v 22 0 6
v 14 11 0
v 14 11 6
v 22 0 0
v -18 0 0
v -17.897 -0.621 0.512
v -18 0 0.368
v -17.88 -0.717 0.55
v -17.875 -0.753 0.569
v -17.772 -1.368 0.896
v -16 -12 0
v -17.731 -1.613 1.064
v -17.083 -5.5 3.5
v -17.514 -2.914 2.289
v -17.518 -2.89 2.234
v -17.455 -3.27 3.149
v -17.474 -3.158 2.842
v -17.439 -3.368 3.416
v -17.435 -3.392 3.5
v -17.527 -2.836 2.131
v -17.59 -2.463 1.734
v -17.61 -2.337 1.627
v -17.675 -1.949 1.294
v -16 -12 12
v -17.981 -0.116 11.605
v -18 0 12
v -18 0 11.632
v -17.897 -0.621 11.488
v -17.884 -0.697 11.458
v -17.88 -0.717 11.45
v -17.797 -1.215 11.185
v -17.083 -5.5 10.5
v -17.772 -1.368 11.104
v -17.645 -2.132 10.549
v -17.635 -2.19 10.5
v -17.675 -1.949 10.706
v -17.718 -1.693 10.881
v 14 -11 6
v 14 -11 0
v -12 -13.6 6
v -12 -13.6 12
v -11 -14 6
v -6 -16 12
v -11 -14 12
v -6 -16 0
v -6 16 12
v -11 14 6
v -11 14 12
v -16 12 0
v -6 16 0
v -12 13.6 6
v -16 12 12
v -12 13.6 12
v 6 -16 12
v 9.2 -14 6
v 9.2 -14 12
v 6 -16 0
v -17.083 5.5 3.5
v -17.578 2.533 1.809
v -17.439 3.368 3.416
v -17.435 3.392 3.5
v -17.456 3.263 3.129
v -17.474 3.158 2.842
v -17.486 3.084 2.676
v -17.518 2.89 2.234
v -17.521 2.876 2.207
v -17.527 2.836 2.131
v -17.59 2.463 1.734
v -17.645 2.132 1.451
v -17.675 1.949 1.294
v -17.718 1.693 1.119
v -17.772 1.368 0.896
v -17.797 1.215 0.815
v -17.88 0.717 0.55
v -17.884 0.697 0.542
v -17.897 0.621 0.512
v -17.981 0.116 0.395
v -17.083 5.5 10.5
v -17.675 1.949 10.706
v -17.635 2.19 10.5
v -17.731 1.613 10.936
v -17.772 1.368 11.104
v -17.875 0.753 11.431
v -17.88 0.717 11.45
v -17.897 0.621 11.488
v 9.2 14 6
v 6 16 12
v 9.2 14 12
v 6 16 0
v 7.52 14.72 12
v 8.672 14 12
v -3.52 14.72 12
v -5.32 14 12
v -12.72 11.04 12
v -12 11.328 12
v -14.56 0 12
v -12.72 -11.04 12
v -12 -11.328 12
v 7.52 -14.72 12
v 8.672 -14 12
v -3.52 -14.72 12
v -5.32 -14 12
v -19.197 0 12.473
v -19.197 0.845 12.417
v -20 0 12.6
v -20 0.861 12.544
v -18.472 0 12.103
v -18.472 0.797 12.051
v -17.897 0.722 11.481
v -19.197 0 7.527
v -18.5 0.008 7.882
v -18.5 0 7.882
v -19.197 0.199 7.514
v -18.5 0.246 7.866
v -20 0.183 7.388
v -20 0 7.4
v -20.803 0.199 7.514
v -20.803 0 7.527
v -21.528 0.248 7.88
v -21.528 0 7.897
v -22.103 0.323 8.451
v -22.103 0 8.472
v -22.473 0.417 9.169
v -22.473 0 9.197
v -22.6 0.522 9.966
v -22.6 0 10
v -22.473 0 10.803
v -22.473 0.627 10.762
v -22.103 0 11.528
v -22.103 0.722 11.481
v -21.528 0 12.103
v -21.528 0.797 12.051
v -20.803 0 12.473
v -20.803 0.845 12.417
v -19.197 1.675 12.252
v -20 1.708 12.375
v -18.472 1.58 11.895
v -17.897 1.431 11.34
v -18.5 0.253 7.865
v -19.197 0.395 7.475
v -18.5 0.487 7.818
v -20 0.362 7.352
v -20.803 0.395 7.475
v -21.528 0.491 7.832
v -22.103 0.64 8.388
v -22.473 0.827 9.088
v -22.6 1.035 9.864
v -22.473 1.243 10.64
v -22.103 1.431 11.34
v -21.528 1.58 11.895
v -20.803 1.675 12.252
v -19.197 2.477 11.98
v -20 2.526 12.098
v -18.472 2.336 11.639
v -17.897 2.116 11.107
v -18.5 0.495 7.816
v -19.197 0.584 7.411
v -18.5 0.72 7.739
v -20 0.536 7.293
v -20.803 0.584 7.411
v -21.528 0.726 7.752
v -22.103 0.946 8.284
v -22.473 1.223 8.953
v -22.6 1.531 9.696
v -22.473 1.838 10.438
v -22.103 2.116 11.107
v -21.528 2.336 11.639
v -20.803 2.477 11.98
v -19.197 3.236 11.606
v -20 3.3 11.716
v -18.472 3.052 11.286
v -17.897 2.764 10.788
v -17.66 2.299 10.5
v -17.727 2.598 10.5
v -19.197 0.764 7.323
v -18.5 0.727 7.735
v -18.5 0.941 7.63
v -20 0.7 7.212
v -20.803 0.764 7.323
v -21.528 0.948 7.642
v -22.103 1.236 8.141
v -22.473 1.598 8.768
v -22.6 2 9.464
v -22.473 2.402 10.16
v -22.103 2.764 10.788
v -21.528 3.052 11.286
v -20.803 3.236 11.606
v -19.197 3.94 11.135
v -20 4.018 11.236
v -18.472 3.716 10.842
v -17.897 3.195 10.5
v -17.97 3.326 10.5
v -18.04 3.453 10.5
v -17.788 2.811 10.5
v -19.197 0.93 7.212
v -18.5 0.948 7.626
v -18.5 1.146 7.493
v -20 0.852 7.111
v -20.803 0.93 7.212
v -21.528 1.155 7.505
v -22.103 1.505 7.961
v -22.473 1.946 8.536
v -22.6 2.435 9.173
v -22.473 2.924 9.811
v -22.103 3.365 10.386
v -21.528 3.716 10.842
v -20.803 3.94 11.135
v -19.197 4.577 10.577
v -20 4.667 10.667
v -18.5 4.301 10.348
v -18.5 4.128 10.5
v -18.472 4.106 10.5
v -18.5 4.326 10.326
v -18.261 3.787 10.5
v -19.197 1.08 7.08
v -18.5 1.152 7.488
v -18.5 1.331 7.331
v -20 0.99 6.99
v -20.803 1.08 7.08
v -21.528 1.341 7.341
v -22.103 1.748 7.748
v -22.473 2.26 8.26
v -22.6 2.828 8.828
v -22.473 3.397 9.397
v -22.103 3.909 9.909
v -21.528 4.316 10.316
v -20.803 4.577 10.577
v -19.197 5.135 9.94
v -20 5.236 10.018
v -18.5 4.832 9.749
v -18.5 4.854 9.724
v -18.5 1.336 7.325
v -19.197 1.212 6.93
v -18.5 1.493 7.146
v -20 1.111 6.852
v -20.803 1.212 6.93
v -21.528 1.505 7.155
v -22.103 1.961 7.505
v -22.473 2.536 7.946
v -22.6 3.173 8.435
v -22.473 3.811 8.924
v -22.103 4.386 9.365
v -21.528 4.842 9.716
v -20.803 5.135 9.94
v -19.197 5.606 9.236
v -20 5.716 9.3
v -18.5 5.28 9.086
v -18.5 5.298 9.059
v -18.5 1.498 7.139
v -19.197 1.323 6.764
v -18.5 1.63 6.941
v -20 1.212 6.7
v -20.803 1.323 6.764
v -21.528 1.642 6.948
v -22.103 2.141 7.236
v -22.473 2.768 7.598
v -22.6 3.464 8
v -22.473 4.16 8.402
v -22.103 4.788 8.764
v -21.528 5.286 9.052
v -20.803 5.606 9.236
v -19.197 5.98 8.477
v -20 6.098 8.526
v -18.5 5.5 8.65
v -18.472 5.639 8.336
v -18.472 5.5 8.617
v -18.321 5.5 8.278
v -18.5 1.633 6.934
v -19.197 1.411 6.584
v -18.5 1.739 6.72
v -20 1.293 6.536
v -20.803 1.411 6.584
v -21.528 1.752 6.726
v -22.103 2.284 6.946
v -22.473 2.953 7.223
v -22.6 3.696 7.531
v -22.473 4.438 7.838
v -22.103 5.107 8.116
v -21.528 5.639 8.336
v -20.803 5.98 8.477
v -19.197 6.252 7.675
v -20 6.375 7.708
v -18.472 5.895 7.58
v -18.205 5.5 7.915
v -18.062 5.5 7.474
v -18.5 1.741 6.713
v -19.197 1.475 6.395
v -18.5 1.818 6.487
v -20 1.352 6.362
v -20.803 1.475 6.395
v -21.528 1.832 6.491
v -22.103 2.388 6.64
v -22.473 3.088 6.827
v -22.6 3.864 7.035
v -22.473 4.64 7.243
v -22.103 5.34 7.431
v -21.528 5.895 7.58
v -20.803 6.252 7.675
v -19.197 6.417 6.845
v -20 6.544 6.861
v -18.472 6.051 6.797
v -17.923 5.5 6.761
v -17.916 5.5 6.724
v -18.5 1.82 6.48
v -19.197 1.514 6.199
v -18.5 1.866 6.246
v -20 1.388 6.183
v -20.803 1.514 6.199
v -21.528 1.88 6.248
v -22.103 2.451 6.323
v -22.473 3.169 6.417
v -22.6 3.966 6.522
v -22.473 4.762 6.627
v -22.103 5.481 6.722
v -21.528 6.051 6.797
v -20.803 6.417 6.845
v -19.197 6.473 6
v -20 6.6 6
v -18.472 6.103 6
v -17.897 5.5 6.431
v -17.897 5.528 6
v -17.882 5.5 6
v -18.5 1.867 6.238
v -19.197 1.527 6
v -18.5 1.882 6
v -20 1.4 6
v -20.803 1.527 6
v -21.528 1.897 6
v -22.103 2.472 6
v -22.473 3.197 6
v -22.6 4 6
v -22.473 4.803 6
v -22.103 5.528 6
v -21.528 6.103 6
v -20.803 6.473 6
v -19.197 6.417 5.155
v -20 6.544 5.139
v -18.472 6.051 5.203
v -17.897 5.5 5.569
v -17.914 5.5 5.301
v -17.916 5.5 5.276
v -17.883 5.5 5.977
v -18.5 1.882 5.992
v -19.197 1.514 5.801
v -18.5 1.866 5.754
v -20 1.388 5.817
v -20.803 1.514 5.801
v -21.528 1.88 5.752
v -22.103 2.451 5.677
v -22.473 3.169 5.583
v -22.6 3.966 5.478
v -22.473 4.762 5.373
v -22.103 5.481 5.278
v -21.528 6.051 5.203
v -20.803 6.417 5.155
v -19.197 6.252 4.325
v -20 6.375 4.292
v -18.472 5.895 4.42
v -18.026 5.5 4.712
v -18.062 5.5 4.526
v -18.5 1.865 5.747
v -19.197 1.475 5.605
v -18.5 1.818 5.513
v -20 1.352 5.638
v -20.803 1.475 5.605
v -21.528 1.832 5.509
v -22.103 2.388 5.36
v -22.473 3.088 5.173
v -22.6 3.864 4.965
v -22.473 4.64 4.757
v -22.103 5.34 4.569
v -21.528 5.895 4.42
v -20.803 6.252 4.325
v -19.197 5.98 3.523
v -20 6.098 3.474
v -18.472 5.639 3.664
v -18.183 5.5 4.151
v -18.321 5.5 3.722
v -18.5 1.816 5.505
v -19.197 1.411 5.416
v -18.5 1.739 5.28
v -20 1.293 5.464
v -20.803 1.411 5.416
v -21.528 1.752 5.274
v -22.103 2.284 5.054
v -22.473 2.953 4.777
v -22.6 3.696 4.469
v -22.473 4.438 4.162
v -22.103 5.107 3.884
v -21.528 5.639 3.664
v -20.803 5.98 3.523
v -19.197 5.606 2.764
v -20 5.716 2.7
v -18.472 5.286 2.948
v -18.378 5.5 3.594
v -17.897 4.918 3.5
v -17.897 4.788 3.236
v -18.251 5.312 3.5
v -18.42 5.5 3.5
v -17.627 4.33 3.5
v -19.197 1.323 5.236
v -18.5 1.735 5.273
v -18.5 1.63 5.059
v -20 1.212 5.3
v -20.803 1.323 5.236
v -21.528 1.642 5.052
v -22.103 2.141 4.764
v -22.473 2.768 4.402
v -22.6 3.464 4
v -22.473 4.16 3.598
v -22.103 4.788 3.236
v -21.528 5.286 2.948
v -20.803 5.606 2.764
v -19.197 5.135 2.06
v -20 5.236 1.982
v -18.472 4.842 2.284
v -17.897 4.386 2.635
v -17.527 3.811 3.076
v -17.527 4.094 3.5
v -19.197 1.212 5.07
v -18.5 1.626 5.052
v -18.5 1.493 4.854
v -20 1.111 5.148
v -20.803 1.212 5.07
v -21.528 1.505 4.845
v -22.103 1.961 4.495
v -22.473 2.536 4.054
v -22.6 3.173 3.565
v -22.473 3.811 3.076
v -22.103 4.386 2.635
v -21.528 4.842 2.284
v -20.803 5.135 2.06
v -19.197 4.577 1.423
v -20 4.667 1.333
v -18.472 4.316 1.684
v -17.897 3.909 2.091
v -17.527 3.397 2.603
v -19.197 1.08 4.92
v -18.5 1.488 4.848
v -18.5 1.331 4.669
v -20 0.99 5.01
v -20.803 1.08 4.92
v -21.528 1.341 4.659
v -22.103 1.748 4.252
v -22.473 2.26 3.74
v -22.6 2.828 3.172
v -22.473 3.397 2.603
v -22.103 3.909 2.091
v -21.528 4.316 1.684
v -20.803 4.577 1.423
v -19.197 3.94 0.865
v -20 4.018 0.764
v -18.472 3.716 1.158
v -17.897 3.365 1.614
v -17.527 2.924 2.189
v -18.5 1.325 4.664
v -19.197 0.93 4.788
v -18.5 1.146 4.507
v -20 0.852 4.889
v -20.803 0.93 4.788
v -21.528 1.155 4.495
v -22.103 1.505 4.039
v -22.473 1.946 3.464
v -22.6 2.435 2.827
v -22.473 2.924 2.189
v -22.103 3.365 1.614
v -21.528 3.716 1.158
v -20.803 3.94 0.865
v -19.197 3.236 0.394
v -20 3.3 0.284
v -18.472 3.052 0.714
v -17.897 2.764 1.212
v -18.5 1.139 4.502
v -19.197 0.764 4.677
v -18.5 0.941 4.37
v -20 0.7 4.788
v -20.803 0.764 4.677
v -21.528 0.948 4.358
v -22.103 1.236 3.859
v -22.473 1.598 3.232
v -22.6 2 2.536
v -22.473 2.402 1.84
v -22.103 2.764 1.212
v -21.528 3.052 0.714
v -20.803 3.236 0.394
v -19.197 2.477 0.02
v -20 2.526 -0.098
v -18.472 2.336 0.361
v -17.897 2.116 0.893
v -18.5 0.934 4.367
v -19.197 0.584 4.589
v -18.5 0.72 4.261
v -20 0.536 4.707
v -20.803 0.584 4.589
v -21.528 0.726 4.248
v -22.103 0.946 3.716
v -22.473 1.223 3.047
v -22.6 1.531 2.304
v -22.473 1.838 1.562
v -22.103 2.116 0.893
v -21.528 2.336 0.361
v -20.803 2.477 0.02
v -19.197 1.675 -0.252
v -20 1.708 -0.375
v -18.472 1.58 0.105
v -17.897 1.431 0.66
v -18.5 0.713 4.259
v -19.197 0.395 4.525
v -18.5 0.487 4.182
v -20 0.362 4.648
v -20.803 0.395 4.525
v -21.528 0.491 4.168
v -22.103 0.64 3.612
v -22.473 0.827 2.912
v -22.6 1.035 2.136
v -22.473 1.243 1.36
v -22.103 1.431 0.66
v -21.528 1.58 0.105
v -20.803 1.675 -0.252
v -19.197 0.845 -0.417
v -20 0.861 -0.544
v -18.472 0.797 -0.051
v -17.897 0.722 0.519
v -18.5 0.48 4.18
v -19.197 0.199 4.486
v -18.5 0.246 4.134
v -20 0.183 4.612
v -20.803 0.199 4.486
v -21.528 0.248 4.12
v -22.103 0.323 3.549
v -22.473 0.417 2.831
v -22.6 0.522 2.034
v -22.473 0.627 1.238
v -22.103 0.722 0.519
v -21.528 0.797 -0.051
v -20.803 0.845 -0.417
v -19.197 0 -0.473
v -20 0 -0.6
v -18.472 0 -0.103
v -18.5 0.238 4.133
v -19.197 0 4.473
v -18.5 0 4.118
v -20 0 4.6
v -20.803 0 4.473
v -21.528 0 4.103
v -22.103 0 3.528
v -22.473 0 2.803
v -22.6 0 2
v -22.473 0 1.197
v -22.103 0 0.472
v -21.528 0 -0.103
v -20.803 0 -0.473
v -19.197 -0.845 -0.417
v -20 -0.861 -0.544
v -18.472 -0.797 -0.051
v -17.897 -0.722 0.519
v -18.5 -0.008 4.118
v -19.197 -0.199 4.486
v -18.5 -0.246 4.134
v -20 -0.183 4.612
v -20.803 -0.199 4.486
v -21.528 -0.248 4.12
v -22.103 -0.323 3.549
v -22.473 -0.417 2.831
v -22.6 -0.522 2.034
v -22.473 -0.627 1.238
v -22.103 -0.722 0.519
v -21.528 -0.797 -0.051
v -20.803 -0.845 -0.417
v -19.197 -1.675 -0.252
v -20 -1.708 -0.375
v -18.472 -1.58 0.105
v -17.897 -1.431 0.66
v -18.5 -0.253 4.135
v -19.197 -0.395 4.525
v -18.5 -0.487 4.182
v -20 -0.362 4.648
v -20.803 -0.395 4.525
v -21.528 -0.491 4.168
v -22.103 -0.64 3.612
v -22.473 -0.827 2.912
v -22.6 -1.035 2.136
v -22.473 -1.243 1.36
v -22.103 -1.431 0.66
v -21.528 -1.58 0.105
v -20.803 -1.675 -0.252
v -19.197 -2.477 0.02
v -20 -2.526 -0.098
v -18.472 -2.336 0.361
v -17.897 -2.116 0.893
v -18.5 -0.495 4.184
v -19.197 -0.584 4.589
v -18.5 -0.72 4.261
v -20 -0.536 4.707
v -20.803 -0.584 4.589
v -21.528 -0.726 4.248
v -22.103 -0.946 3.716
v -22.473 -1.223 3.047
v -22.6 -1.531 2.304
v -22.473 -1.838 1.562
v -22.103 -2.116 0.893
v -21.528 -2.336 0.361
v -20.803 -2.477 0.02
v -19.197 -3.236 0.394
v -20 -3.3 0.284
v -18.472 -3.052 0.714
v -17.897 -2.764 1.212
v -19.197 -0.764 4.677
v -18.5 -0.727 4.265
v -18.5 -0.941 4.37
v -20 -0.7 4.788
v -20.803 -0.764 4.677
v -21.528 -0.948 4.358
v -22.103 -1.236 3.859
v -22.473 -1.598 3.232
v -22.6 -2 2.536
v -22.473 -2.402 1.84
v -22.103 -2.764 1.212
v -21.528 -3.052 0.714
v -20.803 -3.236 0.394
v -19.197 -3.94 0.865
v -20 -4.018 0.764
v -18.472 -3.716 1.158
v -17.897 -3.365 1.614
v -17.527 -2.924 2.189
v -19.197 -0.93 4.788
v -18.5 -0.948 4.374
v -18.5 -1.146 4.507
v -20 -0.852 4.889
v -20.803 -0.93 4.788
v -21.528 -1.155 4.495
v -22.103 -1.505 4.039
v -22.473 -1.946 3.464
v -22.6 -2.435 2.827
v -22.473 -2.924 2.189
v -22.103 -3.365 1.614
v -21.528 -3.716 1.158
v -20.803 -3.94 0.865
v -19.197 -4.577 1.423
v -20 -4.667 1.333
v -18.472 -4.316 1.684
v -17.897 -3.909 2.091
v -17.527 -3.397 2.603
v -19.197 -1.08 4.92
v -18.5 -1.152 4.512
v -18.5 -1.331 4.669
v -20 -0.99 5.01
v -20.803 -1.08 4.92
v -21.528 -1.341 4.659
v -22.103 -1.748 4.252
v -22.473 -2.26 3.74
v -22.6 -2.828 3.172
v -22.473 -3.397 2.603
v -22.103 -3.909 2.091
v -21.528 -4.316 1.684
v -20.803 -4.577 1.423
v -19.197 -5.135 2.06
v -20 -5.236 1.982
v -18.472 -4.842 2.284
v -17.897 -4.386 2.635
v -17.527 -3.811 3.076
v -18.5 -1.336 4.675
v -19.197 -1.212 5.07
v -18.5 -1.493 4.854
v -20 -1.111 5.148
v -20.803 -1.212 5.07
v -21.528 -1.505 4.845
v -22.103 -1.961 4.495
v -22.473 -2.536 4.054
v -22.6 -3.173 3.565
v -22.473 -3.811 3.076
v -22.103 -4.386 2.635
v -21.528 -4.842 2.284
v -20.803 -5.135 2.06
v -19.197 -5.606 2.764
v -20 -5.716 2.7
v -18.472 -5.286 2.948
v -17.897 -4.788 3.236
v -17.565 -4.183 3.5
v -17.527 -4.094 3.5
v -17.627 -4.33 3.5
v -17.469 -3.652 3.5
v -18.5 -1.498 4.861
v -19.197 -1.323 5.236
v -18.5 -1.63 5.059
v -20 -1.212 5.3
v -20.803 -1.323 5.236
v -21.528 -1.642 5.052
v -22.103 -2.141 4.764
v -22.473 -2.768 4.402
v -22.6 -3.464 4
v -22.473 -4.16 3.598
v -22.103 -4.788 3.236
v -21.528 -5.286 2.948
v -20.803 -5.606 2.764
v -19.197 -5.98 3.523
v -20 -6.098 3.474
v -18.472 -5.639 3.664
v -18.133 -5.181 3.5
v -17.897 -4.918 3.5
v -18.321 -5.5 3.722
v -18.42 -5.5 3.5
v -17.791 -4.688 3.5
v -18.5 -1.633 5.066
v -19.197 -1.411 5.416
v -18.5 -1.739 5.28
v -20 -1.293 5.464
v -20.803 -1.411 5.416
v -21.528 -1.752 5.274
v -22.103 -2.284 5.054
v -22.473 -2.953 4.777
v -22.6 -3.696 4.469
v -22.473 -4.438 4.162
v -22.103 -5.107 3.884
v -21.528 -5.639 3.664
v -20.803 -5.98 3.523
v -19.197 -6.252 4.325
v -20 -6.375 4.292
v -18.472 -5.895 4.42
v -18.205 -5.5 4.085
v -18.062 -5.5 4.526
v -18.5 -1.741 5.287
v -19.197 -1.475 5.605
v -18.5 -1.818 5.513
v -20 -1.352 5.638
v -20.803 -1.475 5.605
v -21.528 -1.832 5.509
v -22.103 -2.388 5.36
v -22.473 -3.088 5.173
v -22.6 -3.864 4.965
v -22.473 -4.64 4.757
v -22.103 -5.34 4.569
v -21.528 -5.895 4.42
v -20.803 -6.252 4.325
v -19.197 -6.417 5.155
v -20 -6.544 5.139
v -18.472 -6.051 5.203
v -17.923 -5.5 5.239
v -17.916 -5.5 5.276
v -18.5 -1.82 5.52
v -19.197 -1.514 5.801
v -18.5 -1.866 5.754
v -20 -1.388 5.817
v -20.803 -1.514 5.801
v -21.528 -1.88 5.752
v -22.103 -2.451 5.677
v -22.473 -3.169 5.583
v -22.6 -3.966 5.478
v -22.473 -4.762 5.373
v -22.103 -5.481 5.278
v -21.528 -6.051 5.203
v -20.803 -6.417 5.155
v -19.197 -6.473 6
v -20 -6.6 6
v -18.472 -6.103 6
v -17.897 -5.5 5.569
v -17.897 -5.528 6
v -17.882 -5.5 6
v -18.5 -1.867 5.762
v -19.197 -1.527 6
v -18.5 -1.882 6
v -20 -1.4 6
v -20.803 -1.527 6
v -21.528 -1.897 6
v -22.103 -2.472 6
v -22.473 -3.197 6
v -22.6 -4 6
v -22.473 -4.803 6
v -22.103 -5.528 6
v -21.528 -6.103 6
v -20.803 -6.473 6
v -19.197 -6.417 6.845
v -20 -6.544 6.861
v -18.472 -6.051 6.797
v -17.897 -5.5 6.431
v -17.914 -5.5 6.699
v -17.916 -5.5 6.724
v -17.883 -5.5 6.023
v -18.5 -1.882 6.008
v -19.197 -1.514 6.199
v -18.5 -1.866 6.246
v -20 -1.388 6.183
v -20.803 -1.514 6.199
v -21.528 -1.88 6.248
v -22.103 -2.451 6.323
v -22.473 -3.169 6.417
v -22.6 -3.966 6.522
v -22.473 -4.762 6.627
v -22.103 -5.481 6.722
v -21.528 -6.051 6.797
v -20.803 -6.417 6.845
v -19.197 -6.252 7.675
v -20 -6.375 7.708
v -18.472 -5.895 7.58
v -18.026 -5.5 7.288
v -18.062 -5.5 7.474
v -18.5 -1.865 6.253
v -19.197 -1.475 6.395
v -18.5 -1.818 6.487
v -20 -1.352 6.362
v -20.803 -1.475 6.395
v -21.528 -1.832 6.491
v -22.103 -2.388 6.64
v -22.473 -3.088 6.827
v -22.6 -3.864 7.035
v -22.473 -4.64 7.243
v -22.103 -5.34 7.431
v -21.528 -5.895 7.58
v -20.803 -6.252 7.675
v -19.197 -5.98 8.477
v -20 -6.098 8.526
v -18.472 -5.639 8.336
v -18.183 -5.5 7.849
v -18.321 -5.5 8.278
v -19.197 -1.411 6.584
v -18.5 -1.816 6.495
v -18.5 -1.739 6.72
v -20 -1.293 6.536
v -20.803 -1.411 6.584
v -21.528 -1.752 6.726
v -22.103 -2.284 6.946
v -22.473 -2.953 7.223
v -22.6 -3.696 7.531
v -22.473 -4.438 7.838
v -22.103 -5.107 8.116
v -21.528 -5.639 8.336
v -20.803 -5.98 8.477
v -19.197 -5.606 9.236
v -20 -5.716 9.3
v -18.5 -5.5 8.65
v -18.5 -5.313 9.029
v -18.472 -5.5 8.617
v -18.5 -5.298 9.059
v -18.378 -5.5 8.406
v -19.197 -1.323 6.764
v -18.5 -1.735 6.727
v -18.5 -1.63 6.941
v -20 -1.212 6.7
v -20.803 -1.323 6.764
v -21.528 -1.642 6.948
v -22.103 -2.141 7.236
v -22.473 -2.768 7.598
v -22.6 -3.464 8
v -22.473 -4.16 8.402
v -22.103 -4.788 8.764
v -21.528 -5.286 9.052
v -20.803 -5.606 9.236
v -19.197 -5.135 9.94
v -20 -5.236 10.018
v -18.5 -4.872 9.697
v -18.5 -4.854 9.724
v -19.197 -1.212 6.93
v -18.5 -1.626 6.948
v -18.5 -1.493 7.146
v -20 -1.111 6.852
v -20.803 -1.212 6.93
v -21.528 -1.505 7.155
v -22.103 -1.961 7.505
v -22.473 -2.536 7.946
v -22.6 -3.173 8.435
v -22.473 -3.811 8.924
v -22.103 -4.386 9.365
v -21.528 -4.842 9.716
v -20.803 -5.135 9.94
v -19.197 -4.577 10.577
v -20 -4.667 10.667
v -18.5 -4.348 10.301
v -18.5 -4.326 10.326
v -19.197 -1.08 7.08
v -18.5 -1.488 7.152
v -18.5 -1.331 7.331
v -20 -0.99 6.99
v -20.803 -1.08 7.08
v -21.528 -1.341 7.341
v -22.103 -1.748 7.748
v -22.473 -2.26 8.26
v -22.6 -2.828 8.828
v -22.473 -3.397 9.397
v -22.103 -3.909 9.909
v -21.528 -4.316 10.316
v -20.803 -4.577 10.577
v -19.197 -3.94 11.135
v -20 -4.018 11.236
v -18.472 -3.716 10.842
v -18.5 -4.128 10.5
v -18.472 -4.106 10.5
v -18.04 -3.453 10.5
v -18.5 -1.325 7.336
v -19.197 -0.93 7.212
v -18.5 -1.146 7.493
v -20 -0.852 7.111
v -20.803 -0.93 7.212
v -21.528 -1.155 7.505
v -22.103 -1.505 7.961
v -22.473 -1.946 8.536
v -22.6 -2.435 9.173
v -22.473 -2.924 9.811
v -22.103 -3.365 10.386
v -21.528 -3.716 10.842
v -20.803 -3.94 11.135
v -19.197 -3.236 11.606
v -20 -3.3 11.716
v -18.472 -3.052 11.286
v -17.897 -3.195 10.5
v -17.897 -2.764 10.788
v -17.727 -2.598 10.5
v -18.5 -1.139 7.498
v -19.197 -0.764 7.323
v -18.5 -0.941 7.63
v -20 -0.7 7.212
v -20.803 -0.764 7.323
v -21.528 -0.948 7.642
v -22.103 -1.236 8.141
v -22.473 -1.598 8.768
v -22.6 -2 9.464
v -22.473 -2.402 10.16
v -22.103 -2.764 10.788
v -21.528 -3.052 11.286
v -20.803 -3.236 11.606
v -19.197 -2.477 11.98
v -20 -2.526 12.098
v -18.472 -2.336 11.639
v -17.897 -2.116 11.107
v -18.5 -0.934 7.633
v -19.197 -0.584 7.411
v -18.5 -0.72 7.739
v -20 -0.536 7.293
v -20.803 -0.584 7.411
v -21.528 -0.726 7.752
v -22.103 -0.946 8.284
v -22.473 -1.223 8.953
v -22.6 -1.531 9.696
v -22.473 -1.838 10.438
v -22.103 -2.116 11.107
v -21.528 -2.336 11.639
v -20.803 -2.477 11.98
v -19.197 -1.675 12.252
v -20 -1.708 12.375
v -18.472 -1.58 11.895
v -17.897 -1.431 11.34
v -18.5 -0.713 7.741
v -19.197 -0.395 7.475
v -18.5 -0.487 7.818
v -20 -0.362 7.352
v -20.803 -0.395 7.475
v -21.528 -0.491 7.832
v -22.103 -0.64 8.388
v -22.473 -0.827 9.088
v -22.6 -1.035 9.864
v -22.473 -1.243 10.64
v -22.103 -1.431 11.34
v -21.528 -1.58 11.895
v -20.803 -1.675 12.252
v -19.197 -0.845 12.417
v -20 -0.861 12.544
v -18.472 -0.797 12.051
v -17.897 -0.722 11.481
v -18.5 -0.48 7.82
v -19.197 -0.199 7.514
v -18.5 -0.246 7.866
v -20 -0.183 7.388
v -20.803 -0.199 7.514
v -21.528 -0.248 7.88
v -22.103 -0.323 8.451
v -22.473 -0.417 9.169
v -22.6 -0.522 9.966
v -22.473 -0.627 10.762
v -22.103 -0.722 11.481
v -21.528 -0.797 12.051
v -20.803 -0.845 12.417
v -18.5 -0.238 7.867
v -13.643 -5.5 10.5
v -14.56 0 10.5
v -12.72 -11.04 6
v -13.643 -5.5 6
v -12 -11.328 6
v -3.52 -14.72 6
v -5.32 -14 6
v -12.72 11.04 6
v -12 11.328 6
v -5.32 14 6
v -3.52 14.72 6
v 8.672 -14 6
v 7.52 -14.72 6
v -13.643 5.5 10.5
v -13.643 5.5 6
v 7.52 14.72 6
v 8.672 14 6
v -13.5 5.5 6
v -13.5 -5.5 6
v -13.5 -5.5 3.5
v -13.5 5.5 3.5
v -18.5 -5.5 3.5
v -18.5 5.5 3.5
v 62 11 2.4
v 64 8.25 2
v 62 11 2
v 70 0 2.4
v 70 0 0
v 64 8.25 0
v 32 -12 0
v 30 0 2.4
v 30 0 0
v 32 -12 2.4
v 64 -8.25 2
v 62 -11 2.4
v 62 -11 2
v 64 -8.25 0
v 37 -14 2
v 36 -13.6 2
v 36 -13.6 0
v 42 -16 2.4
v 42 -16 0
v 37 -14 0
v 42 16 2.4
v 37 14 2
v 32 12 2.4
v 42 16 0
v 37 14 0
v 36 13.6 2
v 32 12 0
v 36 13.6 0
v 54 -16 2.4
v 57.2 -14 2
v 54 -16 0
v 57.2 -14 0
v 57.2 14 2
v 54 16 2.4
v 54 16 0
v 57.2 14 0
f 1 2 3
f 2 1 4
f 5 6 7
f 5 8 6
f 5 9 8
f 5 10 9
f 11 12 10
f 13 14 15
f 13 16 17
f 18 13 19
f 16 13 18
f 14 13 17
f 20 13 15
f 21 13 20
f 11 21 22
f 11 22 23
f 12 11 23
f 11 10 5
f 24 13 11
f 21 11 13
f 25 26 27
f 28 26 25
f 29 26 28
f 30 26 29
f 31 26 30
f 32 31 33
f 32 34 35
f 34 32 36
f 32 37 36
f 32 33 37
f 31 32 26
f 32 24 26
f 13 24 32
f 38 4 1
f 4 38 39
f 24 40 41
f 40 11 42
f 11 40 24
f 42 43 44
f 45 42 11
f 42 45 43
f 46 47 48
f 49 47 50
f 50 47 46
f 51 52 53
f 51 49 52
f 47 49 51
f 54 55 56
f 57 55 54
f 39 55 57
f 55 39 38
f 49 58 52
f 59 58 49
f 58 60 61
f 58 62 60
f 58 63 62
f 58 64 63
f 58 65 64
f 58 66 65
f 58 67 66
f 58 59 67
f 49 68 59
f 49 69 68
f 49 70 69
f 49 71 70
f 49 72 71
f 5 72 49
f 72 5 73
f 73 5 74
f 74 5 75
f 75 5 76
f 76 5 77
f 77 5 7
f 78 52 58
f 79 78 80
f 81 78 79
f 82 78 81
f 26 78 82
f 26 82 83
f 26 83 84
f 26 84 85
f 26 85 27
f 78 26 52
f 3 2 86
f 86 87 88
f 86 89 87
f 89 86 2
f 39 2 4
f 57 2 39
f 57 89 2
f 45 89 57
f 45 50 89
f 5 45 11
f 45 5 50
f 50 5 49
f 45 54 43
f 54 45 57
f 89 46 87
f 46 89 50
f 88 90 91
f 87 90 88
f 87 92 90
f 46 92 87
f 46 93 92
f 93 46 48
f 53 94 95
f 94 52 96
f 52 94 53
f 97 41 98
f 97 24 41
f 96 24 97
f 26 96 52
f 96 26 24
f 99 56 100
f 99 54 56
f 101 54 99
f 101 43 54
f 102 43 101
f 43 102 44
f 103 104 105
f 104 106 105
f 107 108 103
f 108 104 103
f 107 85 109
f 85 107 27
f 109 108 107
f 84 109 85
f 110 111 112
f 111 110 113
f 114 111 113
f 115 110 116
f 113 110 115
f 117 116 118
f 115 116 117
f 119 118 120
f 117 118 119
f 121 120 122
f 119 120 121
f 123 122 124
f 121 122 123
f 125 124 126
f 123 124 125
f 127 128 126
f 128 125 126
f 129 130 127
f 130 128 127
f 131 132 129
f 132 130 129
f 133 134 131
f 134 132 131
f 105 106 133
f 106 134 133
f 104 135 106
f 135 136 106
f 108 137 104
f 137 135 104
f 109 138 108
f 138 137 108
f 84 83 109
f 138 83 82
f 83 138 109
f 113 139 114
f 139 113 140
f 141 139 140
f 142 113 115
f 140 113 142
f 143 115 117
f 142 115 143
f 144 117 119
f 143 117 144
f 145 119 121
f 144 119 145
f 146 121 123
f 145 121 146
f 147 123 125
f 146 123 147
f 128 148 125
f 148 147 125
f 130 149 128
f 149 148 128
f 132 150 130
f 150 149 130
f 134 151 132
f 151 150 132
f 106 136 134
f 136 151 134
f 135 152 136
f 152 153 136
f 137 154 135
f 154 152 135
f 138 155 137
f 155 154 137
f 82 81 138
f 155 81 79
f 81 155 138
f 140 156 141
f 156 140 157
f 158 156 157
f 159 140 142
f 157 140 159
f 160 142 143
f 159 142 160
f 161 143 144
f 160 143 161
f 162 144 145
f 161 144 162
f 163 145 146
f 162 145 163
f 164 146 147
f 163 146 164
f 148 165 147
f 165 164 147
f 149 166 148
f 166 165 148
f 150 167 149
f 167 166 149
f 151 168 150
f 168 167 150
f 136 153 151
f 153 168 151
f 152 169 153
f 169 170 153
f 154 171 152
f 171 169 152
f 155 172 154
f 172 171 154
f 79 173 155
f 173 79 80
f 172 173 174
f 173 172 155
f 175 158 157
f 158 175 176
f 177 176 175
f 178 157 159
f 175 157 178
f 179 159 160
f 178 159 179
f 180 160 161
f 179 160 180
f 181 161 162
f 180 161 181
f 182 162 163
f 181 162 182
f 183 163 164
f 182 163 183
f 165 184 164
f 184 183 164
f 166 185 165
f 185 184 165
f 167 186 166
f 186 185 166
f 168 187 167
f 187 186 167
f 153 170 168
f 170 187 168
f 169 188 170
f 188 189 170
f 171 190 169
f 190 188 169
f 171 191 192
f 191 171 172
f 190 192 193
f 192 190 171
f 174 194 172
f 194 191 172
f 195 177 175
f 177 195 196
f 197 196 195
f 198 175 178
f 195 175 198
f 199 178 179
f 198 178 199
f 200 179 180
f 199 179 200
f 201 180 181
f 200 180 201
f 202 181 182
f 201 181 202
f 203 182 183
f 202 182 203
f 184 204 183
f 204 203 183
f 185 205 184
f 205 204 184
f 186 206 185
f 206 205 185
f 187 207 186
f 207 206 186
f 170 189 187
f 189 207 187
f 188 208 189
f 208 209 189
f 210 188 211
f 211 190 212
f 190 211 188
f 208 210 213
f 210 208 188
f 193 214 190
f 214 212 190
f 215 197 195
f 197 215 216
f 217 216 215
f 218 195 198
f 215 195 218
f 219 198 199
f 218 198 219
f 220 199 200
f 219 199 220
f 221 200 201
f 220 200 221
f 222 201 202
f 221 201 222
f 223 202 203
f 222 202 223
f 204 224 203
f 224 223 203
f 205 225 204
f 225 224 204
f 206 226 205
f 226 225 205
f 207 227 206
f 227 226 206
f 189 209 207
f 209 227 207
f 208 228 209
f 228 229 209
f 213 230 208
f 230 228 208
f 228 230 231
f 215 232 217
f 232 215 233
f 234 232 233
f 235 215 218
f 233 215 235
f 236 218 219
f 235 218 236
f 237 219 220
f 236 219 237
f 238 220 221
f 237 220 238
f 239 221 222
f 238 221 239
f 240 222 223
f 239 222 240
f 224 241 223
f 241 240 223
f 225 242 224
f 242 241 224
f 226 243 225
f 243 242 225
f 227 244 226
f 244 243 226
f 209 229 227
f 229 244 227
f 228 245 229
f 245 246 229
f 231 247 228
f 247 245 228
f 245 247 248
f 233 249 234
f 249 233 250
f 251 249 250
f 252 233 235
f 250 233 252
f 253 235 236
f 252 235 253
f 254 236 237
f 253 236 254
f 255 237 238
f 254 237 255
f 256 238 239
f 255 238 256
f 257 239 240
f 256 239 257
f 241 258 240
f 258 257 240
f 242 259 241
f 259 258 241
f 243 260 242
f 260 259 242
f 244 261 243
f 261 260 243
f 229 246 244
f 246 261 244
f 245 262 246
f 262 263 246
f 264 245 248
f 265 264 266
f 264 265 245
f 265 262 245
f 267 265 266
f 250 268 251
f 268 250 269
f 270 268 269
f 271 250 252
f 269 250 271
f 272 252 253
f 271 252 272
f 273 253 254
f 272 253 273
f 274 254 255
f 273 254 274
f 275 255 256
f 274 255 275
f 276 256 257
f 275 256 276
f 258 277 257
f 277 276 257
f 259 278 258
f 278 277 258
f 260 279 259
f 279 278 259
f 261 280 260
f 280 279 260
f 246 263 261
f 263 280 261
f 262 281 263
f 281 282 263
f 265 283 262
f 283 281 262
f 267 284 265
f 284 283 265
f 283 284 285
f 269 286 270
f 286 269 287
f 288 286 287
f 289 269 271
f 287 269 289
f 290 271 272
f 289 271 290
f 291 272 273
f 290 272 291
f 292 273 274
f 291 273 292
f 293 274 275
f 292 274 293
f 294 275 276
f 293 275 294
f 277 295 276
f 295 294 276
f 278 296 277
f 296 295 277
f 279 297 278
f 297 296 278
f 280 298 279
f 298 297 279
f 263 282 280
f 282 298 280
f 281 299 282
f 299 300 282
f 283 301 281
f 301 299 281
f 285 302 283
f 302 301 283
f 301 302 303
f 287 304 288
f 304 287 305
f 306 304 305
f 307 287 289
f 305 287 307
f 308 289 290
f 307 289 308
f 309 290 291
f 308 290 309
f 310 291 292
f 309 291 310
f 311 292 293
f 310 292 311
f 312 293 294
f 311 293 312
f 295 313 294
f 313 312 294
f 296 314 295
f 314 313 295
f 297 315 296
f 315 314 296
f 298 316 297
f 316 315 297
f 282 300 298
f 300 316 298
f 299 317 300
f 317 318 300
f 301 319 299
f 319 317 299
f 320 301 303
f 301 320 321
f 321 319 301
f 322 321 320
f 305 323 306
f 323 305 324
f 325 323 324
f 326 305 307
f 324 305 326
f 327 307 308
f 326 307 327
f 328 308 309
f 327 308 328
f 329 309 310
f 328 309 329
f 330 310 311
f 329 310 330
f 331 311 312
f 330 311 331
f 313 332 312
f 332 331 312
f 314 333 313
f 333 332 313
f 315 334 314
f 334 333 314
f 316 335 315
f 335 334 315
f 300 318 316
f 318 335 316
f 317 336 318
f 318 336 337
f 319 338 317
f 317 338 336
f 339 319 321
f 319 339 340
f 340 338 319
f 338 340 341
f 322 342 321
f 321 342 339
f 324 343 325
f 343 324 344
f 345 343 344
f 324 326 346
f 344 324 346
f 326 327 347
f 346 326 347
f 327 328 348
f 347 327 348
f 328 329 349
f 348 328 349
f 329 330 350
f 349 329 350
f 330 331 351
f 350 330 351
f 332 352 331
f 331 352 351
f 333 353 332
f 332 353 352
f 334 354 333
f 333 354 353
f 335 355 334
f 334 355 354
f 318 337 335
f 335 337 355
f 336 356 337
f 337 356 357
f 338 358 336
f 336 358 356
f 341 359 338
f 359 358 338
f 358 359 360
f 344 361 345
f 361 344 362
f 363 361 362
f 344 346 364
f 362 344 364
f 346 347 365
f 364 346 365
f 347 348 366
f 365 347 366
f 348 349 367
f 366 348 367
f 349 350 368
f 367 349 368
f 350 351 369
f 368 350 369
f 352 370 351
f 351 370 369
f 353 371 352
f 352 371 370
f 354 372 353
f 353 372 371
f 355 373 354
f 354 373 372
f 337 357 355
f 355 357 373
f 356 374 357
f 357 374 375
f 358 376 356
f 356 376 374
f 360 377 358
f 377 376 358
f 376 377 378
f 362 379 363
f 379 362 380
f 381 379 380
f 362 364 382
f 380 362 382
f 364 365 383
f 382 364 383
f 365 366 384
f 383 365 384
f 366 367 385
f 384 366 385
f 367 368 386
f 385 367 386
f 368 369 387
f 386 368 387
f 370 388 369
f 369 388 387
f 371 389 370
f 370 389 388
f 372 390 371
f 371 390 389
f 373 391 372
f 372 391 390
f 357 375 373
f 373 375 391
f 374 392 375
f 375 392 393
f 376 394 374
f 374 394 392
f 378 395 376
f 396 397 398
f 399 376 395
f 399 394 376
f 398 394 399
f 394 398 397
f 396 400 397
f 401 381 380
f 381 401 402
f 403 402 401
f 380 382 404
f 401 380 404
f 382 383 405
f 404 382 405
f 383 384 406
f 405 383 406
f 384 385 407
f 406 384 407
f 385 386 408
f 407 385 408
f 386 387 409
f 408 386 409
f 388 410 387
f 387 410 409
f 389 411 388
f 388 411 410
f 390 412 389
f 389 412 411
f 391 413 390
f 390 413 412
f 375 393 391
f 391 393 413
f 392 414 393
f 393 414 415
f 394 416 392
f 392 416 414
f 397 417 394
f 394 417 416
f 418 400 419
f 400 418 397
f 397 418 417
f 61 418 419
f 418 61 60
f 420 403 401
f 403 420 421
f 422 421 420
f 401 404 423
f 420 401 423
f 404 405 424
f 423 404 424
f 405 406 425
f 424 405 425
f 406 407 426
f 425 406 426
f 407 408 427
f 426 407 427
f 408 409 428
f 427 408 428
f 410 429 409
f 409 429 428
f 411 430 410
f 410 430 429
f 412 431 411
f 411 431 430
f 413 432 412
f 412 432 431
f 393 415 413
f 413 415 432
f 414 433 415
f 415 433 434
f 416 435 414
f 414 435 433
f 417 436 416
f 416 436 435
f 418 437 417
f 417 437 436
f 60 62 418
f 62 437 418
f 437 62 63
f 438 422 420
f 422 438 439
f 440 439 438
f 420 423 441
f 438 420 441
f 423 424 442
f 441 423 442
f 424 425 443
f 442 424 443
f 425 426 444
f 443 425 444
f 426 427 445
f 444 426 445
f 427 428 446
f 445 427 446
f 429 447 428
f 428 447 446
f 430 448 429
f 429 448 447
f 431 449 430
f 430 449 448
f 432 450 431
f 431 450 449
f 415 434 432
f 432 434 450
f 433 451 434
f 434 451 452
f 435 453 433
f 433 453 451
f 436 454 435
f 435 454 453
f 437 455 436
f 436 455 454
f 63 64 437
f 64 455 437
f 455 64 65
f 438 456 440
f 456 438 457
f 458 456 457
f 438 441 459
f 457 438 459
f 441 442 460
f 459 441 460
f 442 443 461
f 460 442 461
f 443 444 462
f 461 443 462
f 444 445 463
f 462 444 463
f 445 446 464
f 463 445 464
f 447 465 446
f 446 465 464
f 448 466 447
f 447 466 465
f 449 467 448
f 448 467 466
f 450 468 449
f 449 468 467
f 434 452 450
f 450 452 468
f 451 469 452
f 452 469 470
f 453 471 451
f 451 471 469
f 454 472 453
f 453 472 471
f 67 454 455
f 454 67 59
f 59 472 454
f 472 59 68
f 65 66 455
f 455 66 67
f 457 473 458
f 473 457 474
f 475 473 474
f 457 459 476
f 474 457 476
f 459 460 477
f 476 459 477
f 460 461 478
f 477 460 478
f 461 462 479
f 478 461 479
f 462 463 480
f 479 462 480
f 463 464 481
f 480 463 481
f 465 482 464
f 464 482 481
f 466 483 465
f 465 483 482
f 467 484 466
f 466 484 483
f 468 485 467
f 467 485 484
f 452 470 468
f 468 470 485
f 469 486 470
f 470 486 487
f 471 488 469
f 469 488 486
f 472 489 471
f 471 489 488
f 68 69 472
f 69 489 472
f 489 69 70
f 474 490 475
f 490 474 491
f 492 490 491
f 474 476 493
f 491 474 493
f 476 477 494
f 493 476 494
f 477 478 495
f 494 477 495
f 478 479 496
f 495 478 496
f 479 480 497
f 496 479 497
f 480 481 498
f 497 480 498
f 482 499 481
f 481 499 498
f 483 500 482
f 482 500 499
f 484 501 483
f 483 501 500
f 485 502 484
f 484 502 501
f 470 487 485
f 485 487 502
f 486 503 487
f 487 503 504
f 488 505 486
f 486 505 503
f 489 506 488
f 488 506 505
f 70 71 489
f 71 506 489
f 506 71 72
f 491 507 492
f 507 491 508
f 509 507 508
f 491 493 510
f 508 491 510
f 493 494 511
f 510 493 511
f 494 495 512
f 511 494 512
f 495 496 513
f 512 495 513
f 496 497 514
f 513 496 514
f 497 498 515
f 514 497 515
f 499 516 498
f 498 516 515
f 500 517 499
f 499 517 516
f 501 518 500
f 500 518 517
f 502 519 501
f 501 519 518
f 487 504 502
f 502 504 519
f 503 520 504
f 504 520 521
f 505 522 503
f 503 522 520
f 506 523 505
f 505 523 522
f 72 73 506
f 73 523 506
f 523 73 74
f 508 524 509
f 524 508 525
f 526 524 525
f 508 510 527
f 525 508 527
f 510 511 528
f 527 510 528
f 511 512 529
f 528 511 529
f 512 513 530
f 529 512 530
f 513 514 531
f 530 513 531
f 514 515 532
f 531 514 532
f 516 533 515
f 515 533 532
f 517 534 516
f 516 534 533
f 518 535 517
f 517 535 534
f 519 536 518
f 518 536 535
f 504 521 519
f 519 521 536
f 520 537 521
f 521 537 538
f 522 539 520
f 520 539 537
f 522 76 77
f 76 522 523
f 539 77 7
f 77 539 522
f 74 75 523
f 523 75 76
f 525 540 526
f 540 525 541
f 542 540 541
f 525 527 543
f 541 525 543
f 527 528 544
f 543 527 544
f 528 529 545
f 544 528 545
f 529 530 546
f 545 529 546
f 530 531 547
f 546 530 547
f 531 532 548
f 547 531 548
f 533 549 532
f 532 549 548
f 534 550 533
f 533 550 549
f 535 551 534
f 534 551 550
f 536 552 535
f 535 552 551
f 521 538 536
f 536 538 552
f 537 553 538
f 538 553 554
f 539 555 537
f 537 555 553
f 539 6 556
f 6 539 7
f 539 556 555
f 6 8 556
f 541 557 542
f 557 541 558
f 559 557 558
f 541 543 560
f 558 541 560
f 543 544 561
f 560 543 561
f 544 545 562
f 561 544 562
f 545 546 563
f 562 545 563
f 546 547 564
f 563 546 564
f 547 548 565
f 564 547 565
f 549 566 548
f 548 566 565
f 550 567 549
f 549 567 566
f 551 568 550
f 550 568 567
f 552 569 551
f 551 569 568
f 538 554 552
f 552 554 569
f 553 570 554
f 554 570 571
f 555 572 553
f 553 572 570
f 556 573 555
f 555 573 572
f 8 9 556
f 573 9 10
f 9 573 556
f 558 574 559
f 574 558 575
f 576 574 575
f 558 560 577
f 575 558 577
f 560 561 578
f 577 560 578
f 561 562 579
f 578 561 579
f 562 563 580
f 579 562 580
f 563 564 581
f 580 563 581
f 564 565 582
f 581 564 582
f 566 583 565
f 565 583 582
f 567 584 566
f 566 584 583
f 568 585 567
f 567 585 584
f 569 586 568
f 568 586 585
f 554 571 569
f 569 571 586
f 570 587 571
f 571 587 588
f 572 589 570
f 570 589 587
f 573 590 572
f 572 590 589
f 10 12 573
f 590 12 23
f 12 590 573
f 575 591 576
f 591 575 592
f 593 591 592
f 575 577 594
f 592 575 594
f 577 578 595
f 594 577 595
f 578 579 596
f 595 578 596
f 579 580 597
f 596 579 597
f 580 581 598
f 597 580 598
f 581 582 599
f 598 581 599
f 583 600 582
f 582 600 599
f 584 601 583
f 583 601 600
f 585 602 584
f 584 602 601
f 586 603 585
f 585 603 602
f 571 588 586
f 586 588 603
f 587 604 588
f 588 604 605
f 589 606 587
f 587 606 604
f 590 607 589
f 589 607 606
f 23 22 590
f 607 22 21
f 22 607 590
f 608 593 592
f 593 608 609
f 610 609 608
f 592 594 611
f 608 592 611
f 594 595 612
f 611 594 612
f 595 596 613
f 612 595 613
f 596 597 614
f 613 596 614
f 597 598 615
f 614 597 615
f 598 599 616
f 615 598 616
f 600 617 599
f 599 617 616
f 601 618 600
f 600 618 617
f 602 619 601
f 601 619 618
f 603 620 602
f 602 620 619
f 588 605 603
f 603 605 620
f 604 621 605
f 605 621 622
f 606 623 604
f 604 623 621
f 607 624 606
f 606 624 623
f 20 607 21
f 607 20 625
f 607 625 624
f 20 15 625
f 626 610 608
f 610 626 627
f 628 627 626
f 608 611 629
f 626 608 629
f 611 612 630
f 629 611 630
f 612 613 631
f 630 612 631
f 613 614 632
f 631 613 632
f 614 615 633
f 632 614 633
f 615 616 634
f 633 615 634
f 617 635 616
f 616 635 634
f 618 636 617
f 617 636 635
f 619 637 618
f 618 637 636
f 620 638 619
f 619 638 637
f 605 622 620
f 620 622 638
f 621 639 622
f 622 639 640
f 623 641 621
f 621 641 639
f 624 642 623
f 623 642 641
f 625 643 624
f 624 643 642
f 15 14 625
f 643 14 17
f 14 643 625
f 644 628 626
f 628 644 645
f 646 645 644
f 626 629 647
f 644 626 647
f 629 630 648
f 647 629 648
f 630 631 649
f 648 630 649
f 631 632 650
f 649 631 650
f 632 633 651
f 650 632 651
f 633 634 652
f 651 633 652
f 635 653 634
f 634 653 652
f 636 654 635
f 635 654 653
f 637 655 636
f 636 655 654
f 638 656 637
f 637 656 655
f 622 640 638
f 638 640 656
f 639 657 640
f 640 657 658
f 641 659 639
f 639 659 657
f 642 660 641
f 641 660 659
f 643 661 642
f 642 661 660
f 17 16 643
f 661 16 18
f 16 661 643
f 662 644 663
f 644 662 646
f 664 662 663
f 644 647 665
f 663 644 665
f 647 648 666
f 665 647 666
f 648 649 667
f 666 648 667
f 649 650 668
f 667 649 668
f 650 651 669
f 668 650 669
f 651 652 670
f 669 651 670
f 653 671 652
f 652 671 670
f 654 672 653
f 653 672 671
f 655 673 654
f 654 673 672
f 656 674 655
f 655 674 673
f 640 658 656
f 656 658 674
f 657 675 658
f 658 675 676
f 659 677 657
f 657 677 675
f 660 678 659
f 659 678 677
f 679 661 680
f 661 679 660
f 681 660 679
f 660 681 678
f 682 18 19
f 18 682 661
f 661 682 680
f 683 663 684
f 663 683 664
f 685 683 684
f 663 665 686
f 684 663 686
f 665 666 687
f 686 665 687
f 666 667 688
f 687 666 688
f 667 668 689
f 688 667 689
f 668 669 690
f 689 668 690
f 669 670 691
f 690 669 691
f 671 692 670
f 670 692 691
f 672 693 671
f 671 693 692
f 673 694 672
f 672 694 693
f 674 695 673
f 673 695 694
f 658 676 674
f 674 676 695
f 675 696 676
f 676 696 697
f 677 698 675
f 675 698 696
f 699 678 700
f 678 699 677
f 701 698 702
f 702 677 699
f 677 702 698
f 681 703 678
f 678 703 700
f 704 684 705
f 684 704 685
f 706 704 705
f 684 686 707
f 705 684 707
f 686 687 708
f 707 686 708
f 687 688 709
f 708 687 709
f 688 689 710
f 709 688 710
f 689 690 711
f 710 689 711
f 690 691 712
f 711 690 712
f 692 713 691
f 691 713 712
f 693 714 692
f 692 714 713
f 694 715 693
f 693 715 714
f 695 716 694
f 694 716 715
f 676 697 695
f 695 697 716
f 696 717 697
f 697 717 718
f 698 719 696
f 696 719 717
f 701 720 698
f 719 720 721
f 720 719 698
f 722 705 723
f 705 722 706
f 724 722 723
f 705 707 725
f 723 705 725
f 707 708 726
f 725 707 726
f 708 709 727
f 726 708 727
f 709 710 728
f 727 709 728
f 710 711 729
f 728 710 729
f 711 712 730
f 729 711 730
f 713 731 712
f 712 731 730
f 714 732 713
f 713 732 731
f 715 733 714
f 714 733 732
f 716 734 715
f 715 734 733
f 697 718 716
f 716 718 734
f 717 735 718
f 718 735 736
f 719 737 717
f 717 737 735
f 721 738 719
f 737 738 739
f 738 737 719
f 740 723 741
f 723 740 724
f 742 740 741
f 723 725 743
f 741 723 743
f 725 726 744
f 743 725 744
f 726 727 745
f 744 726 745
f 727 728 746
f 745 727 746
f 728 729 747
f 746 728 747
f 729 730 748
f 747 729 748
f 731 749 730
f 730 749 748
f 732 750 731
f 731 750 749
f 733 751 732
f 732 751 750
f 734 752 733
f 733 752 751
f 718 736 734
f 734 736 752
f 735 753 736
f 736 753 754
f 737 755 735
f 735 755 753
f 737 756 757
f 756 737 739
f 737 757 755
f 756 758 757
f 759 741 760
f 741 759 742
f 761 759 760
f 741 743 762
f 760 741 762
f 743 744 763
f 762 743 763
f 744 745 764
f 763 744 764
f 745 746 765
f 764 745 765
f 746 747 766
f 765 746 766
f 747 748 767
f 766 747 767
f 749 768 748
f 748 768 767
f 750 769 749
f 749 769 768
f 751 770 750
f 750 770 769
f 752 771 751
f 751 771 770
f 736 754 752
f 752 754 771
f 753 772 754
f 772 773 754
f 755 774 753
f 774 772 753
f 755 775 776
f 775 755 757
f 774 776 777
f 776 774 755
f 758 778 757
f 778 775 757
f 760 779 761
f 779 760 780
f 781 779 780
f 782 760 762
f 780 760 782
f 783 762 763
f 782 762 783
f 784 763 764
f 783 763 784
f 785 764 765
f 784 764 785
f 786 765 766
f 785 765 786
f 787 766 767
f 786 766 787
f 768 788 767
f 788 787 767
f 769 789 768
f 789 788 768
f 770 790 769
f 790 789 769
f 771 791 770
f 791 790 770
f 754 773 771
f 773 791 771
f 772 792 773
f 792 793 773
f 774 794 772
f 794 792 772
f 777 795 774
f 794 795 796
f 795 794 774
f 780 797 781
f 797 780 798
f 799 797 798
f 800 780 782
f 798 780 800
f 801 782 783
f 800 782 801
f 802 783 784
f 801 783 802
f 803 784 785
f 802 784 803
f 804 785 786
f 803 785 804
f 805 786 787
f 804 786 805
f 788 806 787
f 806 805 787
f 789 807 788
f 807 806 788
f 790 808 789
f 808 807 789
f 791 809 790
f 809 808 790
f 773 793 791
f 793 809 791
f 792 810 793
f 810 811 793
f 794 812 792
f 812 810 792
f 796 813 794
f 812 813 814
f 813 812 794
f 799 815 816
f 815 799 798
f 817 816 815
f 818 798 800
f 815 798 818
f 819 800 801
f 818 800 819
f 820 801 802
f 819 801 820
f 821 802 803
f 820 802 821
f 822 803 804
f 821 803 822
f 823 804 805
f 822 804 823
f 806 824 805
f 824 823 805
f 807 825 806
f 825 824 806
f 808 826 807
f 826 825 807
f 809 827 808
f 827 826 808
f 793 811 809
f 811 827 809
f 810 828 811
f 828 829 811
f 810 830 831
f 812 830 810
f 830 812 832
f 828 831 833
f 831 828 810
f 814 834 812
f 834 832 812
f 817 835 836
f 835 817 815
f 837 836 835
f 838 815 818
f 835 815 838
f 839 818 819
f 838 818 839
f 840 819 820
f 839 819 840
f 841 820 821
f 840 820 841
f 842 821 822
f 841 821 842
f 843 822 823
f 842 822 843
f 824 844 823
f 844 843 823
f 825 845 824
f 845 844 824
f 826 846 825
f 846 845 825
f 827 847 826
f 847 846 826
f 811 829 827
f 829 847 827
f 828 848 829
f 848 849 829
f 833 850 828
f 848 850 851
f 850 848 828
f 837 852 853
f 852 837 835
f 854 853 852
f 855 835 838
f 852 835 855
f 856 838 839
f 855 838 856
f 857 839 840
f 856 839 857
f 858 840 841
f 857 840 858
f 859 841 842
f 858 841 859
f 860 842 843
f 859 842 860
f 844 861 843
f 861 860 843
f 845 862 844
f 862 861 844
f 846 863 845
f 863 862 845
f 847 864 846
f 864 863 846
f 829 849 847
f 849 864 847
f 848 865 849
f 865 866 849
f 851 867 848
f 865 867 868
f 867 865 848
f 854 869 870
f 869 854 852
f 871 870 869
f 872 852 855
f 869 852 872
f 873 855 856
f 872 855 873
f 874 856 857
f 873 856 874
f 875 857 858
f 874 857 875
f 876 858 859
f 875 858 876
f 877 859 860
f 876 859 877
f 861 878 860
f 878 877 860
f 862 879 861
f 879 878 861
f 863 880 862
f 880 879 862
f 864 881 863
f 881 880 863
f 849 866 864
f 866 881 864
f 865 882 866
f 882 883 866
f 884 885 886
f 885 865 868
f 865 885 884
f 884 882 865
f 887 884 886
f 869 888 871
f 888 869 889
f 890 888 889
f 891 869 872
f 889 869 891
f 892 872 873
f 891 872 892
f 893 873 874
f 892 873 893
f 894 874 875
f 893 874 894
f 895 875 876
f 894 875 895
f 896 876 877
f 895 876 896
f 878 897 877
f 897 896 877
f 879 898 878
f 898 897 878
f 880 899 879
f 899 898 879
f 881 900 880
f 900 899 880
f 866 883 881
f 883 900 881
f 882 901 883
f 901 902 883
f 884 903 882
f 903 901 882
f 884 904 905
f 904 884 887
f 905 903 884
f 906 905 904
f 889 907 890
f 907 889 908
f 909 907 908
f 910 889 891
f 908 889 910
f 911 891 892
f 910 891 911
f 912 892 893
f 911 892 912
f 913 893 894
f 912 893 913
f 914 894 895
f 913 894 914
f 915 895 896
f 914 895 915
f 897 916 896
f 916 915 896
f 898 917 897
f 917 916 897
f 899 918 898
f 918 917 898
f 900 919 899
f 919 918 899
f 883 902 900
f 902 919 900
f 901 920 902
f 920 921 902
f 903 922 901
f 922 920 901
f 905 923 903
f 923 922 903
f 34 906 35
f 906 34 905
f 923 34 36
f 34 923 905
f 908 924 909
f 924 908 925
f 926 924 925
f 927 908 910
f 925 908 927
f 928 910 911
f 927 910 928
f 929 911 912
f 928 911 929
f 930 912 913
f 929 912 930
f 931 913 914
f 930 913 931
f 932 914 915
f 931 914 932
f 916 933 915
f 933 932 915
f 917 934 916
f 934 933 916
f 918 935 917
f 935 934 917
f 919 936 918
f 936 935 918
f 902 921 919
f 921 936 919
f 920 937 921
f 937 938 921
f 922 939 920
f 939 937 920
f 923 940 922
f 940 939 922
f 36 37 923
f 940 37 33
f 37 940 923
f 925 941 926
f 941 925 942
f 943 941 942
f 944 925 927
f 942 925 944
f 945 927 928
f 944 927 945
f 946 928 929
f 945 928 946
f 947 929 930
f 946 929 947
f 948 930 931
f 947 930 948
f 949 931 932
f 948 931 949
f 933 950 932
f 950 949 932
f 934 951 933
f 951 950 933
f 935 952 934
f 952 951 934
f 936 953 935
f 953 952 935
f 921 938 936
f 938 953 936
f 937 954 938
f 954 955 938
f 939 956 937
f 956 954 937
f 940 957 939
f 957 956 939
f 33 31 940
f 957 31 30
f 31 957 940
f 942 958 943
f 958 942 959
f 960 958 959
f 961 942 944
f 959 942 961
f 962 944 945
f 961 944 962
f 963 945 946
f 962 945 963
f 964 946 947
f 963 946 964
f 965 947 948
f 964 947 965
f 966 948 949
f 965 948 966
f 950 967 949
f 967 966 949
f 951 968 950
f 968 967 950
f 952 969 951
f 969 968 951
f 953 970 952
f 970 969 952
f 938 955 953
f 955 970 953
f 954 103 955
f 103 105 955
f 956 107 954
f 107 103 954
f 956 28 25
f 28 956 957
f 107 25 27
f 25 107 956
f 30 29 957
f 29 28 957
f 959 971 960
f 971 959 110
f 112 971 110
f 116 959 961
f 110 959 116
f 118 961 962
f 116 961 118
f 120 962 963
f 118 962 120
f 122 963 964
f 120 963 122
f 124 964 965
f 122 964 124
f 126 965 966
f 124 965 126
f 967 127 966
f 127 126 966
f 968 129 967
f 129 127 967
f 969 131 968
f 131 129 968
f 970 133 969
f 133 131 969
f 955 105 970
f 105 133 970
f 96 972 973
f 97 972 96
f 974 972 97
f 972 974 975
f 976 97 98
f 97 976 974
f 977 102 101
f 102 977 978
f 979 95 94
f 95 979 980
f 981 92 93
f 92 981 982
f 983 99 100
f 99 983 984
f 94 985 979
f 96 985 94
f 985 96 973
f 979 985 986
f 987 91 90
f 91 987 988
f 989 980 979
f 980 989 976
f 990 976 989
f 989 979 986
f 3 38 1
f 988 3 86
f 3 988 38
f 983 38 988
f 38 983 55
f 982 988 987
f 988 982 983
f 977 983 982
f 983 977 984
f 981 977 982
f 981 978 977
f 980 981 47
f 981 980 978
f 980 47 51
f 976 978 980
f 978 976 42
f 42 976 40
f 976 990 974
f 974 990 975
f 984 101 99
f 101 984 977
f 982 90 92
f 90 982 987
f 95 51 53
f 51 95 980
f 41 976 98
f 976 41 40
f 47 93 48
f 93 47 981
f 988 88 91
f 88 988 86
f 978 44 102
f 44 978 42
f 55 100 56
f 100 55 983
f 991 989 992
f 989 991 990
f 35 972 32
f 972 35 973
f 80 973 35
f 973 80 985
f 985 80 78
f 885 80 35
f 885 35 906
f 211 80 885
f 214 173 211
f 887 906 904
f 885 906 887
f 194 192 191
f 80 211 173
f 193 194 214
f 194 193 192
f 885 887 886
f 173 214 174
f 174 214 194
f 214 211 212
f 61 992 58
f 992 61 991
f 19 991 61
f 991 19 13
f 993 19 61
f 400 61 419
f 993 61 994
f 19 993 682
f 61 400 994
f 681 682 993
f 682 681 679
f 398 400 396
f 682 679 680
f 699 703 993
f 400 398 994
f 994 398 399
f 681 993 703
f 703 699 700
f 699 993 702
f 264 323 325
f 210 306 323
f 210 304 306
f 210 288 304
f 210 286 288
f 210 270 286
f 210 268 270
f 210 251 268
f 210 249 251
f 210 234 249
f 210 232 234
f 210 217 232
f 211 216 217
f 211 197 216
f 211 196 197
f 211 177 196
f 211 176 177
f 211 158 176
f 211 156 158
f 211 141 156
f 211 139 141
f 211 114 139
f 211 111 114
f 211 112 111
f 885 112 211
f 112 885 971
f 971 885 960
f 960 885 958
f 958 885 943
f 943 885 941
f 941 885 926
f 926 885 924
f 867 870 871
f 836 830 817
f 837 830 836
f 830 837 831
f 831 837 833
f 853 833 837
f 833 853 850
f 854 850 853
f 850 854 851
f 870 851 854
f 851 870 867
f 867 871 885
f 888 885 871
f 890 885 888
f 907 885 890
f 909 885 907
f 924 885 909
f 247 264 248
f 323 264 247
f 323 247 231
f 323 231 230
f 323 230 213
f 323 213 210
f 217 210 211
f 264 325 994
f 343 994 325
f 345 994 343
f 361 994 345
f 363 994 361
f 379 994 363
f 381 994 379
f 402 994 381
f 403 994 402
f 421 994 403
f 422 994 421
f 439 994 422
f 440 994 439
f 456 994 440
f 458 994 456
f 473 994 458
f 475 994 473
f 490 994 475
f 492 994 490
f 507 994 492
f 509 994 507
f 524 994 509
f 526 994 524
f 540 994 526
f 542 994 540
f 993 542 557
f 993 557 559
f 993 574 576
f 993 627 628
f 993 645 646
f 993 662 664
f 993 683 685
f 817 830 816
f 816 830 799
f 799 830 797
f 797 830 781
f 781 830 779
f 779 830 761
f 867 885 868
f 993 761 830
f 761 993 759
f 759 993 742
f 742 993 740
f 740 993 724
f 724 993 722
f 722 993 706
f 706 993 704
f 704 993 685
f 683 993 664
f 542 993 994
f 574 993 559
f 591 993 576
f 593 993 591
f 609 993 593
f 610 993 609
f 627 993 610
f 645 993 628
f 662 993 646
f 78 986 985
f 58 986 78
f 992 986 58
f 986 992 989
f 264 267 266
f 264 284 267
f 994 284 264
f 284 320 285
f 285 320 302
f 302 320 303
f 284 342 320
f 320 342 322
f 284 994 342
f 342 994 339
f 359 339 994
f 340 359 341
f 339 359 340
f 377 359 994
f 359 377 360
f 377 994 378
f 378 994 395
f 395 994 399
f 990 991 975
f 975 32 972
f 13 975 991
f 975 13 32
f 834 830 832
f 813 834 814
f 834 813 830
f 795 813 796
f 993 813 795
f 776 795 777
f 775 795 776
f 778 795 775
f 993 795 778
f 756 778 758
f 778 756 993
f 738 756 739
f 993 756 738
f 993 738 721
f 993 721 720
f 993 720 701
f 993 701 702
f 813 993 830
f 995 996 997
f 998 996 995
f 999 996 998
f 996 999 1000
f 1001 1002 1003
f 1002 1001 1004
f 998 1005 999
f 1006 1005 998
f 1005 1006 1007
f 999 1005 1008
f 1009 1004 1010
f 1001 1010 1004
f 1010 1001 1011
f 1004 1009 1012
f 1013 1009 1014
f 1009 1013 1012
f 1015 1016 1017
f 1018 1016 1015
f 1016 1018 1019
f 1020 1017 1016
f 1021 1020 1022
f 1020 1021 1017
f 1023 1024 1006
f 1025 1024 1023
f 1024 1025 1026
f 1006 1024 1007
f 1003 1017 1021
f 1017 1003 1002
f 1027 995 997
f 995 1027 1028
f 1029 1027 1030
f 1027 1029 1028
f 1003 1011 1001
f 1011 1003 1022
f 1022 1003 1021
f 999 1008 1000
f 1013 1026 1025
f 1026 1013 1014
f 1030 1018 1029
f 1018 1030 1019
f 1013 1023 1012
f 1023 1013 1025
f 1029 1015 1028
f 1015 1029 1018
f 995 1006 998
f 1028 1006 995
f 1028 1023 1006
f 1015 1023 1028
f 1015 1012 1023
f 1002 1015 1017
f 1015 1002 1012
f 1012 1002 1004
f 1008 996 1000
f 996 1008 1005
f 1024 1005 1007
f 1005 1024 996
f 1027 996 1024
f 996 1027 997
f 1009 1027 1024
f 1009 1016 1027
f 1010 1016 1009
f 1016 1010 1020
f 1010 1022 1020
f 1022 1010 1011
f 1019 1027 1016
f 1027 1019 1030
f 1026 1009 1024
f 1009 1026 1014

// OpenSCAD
// Cyclops XIAO — V2 "Leaf"
// Elegant teardrop/leaf pendant: wide end holds the board+screen, narrow
// end tapers to a lanyard eye. Organic, fashion-jewelry feel.
//
// Render: openscad cyclops_xiao_v2_leaf.scad
// Export: openscad -D 'PART="body"' -o v2_body.stl cyclops_xiao_v2_leaf.scad

xiao_l = 21.0; xiao_w = 17.5; wall = 2.0;
base_h = 6.0; body_h = 12.0;
win_w = 28.0; win_h = 28.0;
$fn = 48;

// leaf outline in XZ: wide at +X (board), tip at -X (lanyard)
module leaf_profile(h){
  // 2D leaf shape
  polygon(points=[
    [ 22, 0],   // tip (lanyard)
    [ 14, 11],
    [ 6,  16],
    [-6,  16],
    [-16, 12],
    [-18, 0],   // back
    [-16,-12],
    [-6, -16],
    [ 6, -16],
    [ 14,-11]
  ]);
}
module leaf_solid(h){
  linear_extrude(height=h, center=false, convexity=4, scale=1.0)
    leaf_profile();
}

module body(){
  difference(){
    union(){
      leaf_solid(body_h);
      // lanyard eye at tip
      translate([-20,0,body_h/2]) rotate([0,90,0])
        torus_eye();
    }
    translate([2,0,base_h]) scale([0.92,0.92,1])
      leaf_solid(body_h-base_h+2);
    // screen window on the wide flat area (top)
    translate([2,0,body_h-3]) cube([win_w, win_h, 6], center=true);
    // USB-C at back
    translate([-16,0,base_h+1]) cube([5,11,7], center=true);
    // buttons near wide end
    translate([14,-6,body_h-2]) cylinder(d=5.5,h=5,$fn=20,center=true);
    translate([14, 6,body_h-2]) cylinder(d=5.5,h=5,$fn=20,center=true);
    translate([14, 0,body_h-2]) cylinder(d=5.5,h=5,$fn=20,center=true);
  }
}
module torus_eye(){
  rotate_extrude(convexity=4)
    translate([4,0,0]) circle(r=2.6,$fn=20);
}

module lid(){
  difference(){
    leaf_solid(2.4);
    translate([2,0,-1]) cube([win_w, win_h, 6], center=true);
  }
}

PART = undef;
if (!is_undef(PART) && PART=="body") body();
else if (!is_undef(PART) && PART=="lid") lid();
else { body(); translate([48,0,0]) lid(); }
